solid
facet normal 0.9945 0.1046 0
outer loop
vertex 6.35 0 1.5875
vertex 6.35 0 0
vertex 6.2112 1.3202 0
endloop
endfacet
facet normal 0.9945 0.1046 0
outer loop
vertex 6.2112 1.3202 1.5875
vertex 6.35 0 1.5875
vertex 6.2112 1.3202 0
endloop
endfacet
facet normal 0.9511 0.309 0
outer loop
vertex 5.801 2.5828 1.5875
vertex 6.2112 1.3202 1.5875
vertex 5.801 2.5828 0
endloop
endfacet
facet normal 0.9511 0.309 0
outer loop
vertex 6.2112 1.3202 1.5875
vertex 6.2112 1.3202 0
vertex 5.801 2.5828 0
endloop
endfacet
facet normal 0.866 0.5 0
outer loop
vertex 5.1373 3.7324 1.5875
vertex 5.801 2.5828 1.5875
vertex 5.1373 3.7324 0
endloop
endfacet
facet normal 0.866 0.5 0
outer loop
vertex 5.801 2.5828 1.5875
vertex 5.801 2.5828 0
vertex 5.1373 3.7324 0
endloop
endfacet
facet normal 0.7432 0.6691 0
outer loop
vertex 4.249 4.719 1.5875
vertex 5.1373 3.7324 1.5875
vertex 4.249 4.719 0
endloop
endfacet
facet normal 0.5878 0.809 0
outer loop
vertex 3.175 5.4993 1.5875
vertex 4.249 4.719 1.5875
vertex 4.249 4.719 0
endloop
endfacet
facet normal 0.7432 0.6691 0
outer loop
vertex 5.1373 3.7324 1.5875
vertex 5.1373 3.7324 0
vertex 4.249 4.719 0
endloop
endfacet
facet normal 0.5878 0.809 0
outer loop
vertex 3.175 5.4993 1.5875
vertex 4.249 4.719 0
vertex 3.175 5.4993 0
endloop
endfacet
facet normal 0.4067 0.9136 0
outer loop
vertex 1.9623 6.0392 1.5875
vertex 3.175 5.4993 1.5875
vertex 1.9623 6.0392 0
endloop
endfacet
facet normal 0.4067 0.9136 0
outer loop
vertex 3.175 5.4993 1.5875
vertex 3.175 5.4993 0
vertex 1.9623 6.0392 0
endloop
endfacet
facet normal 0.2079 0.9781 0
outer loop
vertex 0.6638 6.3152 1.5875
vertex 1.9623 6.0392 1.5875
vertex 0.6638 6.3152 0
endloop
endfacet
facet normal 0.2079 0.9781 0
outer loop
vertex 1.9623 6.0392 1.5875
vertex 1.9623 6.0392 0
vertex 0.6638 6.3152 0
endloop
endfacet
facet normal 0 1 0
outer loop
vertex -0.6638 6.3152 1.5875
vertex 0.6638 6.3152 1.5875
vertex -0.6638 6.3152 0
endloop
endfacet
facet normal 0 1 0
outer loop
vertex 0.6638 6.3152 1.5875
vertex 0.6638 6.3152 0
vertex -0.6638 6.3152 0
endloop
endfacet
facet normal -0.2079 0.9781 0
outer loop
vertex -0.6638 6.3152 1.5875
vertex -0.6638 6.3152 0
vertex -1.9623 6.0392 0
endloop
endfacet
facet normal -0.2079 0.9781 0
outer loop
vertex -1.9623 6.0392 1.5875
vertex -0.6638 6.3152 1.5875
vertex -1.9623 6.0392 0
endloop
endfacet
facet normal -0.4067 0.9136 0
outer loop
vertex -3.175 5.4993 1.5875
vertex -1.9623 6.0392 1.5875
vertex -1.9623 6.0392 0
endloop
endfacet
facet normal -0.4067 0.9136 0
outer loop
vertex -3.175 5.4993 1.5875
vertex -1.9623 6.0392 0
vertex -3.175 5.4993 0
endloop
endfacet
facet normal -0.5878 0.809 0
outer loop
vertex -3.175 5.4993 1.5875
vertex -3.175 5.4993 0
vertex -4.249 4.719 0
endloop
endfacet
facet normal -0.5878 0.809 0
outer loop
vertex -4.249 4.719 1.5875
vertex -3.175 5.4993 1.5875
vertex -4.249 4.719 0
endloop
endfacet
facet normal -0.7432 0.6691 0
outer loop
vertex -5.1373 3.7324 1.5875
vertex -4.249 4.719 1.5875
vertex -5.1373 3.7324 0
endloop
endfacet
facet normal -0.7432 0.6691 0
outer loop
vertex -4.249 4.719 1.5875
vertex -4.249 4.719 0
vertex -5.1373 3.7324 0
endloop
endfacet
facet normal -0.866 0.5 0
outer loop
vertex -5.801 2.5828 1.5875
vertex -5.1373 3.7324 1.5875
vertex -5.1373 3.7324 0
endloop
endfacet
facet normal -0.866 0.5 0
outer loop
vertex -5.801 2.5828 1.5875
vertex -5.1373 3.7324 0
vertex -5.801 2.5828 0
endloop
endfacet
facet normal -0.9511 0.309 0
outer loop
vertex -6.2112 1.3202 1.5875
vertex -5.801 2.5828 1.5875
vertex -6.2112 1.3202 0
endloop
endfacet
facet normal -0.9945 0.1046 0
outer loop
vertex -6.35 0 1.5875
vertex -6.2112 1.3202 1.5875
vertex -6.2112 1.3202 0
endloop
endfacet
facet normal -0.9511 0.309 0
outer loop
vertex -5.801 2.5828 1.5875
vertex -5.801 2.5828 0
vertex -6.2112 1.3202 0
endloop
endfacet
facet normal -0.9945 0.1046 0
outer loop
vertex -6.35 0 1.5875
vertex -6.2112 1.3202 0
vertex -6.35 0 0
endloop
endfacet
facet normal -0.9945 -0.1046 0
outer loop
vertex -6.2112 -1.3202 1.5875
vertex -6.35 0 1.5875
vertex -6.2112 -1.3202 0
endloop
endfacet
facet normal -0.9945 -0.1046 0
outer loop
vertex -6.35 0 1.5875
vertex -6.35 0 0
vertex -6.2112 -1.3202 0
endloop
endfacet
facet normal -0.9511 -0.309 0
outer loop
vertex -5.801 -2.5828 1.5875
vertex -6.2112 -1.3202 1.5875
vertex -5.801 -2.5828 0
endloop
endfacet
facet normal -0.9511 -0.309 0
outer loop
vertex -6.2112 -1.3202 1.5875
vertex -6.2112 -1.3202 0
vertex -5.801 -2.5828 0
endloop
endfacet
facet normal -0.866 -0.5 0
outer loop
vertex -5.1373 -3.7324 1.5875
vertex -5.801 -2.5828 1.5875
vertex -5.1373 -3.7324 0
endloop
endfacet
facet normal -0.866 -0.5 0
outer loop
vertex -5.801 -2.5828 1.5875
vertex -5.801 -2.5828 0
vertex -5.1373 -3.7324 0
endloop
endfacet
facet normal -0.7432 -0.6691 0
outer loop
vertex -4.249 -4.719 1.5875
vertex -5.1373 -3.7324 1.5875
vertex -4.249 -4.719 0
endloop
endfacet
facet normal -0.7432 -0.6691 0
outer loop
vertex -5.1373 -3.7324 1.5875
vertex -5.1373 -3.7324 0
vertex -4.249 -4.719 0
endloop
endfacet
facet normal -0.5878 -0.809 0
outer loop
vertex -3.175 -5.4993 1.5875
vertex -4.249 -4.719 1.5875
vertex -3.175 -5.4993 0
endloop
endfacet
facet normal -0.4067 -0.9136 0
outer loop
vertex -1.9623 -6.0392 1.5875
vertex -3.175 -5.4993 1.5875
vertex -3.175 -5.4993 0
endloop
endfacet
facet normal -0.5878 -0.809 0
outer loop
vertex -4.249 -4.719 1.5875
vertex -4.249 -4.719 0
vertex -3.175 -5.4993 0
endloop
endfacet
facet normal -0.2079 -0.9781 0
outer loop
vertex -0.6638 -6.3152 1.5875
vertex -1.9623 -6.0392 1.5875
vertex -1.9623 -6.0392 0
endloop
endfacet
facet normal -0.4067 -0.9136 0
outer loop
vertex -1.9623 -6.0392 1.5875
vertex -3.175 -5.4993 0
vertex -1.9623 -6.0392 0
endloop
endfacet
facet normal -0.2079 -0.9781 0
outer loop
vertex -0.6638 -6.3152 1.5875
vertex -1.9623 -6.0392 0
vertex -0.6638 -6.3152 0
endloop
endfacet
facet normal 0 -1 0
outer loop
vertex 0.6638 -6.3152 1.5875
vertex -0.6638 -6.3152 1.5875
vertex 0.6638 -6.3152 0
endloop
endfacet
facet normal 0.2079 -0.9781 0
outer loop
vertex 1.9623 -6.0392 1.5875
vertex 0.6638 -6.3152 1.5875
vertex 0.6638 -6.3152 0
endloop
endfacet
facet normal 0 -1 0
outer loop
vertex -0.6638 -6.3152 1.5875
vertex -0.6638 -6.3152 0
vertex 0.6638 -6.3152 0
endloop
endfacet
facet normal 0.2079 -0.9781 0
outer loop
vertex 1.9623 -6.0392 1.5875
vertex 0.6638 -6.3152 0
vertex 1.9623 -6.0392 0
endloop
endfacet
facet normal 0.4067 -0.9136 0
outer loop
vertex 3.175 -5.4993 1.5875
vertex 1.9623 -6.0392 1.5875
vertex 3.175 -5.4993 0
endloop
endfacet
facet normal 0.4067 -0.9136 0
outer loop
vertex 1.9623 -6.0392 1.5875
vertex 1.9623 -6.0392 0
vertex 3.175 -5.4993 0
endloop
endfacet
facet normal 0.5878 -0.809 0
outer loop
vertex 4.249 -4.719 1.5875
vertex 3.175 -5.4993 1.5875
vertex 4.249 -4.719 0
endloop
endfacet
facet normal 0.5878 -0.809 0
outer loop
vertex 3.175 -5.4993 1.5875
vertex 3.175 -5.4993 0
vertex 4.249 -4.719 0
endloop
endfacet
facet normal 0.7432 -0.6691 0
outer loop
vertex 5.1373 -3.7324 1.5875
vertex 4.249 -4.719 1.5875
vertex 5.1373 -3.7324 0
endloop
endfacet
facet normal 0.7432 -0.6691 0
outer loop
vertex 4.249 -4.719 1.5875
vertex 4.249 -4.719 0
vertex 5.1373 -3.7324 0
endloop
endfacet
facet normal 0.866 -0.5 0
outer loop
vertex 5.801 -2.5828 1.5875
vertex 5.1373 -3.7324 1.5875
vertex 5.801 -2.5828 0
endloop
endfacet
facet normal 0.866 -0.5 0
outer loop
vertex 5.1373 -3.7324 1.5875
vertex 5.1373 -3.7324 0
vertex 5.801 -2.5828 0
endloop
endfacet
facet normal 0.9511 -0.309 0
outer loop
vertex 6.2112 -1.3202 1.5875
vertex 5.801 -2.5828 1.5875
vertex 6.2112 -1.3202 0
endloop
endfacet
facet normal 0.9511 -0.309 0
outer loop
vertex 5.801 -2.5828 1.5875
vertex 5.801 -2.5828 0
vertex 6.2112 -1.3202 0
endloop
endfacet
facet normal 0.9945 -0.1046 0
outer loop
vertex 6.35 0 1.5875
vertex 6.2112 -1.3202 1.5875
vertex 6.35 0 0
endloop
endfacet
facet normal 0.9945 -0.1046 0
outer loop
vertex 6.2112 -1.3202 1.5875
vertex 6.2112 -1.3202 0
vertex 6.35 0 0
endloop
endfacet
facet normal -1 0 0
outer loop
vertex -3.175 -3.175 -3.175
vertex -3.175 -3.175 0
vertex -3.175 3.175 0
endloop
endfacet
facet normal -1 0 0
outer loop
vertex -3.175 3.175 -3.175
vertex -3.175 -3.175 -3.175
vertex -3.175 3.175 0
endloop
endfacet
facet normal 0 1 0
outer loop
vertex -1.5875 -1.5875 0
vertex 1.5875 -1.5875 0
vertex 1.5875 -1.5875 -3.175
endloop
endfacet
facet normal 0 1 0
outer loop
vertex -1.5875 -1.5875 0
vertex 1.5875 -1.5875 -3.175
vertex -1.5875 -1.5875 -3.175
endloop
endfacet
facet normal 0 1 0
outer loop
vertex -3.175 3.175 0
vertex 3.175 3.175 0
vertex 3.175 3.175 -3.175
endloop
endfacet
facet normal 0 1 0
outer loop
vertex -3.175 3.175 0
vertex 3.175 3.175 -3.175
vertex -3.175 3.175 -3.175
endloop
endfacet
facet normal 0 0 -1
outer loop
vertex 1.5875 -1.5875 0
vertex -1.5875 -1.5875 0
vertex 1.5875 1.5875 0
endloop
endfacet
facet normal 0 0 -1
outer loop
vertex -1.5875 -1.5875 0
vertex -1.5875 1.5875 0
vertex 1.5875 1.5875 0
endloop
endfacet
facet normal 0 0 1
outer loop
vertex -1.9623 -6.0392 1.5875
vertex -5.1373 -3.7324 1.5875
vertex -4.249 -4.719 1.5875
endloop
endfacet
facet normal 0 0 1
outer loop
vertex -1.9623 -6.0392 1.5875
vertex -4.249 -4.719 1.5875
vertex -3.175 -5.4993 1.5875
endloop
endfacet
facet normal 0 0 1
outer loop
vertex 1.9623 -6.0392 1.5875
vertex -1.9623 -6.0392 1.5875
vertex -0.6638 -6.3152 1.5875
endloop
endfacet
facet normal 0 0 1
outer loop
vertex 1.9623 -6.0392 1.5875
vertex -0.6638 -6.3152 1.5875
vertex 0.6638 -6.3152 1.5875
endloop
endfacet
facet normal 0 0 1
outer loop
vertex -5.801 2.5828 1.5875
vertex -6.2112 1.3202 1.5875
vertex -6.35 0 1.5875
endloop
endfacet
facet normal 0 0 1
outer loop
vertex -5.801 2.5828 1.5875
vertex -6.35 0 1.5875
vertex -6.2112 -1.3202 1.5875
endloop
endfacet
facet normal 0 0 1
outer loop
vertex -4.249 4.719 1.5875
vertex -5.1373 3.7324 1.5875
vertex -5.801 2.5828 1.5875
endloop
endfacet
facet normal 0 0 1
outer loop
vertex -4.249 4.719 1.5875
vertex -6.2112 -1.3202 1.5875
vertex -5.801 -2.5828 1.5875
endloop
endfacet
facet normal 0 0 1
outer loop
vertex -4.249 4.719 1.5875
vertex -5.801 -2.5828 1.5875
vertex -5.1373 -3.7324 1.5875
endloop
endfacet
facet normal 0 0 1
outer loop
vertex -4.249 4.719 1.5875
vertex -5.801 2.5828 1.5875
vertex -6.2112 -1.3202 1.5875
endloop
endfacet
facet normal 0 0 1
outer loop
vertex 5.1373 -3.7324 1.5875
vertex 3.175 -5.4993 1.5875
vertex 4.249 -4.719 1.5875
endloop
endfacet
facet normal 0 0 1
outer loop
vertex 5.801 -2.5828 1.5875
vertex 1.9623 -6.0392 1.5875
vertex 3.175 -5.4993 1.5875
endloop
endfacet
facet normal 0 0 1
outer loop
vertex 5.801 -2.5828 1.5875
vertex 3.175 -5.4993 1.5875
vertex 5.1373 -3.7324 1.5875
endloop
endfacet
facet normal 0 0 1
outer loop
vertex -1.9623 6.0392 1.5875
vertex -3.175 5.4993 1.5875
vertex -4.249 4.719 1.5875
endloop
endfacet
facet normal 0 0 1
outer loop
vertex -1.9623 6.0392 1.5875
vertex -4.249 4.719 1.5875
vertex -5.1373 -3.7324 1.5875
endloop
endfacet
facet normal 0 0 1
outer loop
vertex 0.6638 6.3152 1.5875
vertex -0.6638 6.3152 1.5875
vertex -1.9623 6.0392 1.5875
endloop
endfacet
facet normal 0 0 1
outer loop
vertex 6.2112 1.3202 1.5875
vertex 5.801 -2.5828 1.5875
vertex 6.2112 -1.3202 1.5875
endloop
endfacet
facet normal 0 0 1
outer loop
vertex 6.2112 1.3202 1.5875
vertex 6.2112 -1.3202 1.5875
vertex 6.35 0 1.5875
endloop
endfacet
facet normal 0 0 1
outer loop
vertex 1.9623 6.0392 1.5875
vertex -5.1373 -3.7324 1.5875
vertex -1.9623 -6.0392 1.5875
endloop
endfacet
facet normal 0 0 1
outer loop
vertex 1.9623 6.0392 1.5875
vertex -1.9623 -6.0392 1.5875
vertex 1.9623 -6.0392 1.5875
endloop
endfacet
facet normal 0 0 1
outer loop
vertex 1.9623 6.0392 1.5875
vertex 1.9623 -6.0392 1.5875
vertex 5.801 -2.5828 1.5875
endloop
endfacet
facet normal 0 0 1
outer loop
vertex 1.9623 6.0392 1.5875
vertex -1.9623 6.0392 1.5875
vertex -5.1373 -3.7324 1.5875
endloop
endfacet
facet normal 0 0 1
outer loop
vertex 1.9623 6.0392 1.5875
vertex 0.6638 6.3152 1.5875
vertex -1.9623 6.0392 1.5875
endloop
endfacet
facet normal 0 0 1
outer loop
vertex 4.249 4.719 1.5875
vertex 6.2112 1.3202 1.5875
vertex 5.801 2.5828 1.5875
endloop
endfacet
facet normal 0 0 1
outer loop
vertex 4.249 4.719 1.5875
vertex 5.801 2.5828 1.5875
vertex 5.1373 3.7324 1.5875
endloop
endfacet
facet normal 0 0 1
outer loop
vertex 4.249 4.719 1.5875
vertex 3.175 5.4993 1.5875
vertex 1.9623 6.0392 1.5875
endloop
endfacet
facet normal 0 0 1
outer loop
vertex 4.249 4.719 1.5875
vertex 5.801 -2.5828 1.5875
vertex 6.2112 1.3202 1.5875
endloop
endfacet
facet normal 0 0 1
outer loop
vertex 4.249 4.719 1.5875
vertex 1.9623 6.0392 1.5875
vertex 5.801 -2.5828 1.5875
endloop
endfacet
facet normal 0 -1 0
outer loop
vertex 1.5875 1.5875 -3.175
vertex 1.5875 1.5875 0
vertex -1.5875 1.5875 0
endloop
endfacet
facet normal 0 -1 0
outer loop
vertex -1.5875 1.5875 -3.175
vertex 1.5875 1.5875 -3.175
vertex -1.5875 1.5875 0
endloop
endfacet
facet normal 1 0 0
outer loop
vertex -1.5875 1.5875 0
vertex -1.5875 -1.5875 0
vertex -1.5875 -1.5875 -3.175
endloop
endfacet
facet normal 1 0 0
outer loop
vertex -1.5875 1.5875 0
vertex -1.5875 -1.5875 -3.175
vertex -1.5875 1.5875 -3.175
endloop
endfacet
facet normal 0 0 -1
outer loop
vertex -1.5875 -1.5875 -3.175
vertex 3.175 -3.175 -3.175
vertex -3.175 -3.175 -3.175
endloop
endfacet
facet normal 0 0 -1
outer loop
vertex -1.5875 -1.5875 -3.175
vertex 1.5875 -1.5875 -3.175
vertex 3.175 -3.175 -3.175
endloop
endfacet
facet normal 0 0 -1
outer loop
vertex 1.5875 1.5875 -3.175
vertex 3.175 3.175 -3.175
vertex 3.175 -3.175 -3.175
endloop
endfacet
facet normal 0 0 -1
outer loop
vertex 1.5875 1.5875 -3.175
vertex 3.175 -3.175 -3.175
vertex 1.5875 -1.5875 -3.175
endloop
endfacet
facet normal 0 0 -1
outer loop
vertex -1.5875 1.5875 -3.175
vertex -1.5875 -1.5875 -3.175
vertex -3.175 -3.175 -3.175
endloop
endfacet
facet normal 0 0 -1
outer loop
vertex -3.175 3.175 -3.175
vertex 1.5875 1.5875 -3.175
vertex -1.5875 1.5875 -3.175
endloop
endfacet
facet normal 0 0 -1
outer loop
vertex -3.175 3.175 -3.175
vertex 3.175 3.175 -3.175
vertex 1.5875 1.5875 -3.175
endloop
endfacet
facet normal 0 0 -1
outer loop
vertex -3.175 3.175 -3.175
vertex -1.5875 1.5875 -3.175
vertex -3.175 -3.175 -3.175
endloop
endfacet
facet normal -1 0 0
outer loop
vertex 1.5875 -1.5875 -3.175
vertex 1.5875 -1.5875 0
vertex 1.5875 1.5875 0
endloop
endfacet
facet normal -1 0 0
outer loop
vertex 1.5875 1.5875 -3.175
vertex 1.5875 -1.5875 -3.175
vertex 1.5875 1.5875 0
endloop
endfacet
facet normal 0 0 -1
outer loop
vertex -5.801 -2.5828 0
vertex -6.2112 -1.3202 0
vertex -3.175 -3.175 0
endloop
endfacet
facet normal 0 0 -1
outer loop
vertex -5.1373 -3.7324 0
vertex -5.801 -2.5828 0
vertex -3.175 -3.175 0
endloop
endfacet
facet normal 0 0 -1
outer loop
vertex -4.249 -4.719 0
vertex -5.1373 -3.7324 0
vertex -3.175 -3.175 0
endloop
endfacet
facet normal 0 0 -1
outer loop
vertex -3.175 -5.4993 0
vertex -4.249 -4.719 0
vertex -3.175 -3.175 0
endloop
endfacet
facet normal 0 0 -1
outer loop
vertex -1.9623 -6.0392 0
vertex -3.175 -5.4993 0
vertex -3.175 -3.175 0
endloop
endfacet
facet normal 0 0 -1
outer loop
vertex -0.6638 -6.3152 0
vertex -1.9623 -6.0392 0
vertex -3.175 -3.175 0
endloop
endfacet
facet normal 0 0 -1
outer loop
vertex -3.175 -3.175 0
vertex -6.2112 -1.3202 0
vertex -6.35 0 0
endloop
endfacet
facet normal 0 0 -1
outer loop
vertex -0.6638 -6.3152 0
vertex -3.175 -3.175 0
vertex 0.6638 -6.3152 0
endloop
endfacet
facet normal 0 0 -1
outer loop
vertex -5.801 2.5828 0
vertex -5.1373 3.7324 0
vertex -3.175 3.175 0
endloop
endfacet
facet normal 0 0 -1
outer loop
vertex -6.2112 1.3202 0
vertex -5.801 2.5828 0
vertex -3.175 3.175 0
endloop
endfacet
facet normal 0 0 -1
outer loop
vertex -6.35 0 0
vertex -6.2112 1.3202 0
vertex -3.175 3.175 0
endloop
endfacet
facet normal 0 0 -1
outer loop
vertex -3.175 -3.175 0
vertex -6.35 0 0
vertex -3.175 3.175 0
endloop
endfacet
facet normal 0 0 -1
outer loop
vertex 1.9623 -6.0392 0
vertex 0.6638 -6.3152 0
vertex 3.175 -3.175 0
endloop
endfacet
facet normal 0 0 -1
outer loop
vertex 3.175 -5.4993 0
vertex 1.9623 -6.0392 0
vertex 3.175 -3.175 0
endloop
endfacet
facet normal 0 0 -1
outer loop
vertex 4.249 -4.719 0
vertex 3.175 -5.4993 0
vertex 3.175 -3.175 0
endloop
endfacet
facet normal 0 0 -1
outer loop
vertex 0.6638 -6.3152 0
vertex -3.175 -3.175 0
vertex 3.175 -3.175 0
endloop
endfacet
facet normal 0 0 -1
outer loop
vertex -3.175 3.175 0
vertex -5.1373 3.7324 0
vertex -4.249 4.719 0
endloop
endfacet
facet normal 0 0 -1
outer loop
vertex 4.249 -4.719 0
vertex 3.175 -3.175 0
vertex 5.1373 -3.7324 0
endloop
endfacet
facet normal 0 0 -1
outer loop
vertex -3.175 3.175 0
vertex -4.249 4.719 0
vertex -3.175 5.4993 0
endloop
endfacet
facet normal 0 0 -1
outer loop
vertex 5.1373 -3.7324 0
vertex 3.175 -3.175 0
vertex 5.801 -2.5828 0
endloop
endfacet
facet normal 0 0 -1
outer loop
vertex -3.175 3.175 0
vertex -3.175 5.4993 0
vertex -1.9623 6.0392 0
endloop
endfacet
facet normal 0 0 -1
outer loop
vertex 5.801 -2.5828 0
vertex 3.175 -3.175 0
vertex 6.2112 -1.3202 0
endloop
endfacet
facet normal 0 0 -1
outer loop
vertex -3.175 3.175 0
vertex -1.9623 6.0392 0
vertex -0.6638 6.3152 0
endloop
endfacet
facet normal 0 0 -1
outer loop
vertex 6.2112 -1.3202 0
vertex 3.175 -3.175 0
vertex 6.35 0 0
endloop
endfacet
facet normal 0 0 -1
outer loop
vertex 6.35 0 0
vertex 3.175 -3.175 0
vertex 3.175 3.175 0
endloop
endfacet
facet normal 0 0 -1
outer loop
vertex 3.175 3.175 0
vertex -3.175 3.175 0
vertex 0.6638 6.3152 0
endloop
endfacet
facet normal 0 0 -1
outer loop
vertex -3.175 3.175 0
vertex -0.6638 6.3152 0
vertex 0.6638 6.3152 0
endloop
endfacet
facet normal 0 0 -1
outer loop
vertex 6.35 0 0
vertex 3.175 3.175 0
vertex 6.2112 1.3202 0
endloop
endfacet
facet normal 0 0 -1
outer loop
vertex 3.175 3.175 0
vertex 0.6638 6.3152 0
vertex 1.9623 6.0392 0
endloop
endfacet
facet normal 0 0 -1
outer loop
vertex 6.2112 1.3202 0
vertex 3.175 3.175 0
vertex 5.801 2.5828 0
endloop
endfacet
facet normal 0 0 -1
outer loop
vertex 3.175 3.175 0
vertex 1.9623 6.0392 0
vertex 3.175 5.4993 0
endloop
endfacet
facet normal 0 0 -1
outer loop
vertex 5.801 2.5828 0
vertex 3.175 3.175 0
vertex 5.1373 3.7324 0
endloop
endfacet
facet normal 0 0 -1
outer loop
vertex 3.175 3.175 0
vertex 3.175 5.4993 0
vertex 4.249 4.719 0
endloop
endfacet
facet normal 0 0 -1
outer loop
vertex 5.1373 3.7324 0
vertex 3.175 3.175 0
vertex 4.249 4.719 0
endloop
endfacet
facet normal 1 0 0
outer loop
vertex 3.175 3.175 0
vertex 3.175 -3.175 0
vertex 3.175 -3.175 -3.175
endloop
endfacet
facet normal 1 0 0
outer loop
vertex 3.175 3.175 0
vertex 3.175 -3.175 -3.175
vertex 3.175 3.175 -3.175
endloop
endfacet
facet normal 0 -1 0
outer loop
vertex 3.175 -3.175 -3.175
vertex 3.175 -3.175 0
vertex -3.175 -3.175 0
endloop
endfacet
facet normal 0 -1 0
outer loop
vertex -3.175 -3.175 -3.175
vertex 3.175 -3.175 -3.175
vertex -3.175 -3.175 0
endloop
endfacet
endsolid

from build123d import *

# Parameters (mm, degrees)
SKETCH2_R           = 6.35
BOSS_EXTRUDE1_DEPTH = 1.5875
SKETCH3_W           = 6.35
SKETCH3_H           = 6.35
SKETCH3_W_2         = 3.175
SKETCH3_H_2         = 3.175
BOSS_EXTRUDE2_DEPTH = 3.175


with BuildPart() as part:
    # Sketch2 → Boss-Extrude1 (new body)
    with BuildSketch(Plane.XY):
        Circle(SKETCH2_R)
    extrude(amount=BOSS_EXTRUDE1_DEPTH)

    # Sketch3 → Boss-Extrude2 (add)
    with BuildSketch(Plane(origin=(0, 0, 0), x_dir=(-1, 0, 0), z_dir=(0, 0, -1))):
        Rectangle(SKETCH3_W, SKETCH3_H)
        Rectangle(SKETCH3_W_2, SKETCH3_H_2, mode=Mode.SUBTRACT)
    extrude(amount=BOSS_EXTRUDE2_DEPTH)


solid = part.part
